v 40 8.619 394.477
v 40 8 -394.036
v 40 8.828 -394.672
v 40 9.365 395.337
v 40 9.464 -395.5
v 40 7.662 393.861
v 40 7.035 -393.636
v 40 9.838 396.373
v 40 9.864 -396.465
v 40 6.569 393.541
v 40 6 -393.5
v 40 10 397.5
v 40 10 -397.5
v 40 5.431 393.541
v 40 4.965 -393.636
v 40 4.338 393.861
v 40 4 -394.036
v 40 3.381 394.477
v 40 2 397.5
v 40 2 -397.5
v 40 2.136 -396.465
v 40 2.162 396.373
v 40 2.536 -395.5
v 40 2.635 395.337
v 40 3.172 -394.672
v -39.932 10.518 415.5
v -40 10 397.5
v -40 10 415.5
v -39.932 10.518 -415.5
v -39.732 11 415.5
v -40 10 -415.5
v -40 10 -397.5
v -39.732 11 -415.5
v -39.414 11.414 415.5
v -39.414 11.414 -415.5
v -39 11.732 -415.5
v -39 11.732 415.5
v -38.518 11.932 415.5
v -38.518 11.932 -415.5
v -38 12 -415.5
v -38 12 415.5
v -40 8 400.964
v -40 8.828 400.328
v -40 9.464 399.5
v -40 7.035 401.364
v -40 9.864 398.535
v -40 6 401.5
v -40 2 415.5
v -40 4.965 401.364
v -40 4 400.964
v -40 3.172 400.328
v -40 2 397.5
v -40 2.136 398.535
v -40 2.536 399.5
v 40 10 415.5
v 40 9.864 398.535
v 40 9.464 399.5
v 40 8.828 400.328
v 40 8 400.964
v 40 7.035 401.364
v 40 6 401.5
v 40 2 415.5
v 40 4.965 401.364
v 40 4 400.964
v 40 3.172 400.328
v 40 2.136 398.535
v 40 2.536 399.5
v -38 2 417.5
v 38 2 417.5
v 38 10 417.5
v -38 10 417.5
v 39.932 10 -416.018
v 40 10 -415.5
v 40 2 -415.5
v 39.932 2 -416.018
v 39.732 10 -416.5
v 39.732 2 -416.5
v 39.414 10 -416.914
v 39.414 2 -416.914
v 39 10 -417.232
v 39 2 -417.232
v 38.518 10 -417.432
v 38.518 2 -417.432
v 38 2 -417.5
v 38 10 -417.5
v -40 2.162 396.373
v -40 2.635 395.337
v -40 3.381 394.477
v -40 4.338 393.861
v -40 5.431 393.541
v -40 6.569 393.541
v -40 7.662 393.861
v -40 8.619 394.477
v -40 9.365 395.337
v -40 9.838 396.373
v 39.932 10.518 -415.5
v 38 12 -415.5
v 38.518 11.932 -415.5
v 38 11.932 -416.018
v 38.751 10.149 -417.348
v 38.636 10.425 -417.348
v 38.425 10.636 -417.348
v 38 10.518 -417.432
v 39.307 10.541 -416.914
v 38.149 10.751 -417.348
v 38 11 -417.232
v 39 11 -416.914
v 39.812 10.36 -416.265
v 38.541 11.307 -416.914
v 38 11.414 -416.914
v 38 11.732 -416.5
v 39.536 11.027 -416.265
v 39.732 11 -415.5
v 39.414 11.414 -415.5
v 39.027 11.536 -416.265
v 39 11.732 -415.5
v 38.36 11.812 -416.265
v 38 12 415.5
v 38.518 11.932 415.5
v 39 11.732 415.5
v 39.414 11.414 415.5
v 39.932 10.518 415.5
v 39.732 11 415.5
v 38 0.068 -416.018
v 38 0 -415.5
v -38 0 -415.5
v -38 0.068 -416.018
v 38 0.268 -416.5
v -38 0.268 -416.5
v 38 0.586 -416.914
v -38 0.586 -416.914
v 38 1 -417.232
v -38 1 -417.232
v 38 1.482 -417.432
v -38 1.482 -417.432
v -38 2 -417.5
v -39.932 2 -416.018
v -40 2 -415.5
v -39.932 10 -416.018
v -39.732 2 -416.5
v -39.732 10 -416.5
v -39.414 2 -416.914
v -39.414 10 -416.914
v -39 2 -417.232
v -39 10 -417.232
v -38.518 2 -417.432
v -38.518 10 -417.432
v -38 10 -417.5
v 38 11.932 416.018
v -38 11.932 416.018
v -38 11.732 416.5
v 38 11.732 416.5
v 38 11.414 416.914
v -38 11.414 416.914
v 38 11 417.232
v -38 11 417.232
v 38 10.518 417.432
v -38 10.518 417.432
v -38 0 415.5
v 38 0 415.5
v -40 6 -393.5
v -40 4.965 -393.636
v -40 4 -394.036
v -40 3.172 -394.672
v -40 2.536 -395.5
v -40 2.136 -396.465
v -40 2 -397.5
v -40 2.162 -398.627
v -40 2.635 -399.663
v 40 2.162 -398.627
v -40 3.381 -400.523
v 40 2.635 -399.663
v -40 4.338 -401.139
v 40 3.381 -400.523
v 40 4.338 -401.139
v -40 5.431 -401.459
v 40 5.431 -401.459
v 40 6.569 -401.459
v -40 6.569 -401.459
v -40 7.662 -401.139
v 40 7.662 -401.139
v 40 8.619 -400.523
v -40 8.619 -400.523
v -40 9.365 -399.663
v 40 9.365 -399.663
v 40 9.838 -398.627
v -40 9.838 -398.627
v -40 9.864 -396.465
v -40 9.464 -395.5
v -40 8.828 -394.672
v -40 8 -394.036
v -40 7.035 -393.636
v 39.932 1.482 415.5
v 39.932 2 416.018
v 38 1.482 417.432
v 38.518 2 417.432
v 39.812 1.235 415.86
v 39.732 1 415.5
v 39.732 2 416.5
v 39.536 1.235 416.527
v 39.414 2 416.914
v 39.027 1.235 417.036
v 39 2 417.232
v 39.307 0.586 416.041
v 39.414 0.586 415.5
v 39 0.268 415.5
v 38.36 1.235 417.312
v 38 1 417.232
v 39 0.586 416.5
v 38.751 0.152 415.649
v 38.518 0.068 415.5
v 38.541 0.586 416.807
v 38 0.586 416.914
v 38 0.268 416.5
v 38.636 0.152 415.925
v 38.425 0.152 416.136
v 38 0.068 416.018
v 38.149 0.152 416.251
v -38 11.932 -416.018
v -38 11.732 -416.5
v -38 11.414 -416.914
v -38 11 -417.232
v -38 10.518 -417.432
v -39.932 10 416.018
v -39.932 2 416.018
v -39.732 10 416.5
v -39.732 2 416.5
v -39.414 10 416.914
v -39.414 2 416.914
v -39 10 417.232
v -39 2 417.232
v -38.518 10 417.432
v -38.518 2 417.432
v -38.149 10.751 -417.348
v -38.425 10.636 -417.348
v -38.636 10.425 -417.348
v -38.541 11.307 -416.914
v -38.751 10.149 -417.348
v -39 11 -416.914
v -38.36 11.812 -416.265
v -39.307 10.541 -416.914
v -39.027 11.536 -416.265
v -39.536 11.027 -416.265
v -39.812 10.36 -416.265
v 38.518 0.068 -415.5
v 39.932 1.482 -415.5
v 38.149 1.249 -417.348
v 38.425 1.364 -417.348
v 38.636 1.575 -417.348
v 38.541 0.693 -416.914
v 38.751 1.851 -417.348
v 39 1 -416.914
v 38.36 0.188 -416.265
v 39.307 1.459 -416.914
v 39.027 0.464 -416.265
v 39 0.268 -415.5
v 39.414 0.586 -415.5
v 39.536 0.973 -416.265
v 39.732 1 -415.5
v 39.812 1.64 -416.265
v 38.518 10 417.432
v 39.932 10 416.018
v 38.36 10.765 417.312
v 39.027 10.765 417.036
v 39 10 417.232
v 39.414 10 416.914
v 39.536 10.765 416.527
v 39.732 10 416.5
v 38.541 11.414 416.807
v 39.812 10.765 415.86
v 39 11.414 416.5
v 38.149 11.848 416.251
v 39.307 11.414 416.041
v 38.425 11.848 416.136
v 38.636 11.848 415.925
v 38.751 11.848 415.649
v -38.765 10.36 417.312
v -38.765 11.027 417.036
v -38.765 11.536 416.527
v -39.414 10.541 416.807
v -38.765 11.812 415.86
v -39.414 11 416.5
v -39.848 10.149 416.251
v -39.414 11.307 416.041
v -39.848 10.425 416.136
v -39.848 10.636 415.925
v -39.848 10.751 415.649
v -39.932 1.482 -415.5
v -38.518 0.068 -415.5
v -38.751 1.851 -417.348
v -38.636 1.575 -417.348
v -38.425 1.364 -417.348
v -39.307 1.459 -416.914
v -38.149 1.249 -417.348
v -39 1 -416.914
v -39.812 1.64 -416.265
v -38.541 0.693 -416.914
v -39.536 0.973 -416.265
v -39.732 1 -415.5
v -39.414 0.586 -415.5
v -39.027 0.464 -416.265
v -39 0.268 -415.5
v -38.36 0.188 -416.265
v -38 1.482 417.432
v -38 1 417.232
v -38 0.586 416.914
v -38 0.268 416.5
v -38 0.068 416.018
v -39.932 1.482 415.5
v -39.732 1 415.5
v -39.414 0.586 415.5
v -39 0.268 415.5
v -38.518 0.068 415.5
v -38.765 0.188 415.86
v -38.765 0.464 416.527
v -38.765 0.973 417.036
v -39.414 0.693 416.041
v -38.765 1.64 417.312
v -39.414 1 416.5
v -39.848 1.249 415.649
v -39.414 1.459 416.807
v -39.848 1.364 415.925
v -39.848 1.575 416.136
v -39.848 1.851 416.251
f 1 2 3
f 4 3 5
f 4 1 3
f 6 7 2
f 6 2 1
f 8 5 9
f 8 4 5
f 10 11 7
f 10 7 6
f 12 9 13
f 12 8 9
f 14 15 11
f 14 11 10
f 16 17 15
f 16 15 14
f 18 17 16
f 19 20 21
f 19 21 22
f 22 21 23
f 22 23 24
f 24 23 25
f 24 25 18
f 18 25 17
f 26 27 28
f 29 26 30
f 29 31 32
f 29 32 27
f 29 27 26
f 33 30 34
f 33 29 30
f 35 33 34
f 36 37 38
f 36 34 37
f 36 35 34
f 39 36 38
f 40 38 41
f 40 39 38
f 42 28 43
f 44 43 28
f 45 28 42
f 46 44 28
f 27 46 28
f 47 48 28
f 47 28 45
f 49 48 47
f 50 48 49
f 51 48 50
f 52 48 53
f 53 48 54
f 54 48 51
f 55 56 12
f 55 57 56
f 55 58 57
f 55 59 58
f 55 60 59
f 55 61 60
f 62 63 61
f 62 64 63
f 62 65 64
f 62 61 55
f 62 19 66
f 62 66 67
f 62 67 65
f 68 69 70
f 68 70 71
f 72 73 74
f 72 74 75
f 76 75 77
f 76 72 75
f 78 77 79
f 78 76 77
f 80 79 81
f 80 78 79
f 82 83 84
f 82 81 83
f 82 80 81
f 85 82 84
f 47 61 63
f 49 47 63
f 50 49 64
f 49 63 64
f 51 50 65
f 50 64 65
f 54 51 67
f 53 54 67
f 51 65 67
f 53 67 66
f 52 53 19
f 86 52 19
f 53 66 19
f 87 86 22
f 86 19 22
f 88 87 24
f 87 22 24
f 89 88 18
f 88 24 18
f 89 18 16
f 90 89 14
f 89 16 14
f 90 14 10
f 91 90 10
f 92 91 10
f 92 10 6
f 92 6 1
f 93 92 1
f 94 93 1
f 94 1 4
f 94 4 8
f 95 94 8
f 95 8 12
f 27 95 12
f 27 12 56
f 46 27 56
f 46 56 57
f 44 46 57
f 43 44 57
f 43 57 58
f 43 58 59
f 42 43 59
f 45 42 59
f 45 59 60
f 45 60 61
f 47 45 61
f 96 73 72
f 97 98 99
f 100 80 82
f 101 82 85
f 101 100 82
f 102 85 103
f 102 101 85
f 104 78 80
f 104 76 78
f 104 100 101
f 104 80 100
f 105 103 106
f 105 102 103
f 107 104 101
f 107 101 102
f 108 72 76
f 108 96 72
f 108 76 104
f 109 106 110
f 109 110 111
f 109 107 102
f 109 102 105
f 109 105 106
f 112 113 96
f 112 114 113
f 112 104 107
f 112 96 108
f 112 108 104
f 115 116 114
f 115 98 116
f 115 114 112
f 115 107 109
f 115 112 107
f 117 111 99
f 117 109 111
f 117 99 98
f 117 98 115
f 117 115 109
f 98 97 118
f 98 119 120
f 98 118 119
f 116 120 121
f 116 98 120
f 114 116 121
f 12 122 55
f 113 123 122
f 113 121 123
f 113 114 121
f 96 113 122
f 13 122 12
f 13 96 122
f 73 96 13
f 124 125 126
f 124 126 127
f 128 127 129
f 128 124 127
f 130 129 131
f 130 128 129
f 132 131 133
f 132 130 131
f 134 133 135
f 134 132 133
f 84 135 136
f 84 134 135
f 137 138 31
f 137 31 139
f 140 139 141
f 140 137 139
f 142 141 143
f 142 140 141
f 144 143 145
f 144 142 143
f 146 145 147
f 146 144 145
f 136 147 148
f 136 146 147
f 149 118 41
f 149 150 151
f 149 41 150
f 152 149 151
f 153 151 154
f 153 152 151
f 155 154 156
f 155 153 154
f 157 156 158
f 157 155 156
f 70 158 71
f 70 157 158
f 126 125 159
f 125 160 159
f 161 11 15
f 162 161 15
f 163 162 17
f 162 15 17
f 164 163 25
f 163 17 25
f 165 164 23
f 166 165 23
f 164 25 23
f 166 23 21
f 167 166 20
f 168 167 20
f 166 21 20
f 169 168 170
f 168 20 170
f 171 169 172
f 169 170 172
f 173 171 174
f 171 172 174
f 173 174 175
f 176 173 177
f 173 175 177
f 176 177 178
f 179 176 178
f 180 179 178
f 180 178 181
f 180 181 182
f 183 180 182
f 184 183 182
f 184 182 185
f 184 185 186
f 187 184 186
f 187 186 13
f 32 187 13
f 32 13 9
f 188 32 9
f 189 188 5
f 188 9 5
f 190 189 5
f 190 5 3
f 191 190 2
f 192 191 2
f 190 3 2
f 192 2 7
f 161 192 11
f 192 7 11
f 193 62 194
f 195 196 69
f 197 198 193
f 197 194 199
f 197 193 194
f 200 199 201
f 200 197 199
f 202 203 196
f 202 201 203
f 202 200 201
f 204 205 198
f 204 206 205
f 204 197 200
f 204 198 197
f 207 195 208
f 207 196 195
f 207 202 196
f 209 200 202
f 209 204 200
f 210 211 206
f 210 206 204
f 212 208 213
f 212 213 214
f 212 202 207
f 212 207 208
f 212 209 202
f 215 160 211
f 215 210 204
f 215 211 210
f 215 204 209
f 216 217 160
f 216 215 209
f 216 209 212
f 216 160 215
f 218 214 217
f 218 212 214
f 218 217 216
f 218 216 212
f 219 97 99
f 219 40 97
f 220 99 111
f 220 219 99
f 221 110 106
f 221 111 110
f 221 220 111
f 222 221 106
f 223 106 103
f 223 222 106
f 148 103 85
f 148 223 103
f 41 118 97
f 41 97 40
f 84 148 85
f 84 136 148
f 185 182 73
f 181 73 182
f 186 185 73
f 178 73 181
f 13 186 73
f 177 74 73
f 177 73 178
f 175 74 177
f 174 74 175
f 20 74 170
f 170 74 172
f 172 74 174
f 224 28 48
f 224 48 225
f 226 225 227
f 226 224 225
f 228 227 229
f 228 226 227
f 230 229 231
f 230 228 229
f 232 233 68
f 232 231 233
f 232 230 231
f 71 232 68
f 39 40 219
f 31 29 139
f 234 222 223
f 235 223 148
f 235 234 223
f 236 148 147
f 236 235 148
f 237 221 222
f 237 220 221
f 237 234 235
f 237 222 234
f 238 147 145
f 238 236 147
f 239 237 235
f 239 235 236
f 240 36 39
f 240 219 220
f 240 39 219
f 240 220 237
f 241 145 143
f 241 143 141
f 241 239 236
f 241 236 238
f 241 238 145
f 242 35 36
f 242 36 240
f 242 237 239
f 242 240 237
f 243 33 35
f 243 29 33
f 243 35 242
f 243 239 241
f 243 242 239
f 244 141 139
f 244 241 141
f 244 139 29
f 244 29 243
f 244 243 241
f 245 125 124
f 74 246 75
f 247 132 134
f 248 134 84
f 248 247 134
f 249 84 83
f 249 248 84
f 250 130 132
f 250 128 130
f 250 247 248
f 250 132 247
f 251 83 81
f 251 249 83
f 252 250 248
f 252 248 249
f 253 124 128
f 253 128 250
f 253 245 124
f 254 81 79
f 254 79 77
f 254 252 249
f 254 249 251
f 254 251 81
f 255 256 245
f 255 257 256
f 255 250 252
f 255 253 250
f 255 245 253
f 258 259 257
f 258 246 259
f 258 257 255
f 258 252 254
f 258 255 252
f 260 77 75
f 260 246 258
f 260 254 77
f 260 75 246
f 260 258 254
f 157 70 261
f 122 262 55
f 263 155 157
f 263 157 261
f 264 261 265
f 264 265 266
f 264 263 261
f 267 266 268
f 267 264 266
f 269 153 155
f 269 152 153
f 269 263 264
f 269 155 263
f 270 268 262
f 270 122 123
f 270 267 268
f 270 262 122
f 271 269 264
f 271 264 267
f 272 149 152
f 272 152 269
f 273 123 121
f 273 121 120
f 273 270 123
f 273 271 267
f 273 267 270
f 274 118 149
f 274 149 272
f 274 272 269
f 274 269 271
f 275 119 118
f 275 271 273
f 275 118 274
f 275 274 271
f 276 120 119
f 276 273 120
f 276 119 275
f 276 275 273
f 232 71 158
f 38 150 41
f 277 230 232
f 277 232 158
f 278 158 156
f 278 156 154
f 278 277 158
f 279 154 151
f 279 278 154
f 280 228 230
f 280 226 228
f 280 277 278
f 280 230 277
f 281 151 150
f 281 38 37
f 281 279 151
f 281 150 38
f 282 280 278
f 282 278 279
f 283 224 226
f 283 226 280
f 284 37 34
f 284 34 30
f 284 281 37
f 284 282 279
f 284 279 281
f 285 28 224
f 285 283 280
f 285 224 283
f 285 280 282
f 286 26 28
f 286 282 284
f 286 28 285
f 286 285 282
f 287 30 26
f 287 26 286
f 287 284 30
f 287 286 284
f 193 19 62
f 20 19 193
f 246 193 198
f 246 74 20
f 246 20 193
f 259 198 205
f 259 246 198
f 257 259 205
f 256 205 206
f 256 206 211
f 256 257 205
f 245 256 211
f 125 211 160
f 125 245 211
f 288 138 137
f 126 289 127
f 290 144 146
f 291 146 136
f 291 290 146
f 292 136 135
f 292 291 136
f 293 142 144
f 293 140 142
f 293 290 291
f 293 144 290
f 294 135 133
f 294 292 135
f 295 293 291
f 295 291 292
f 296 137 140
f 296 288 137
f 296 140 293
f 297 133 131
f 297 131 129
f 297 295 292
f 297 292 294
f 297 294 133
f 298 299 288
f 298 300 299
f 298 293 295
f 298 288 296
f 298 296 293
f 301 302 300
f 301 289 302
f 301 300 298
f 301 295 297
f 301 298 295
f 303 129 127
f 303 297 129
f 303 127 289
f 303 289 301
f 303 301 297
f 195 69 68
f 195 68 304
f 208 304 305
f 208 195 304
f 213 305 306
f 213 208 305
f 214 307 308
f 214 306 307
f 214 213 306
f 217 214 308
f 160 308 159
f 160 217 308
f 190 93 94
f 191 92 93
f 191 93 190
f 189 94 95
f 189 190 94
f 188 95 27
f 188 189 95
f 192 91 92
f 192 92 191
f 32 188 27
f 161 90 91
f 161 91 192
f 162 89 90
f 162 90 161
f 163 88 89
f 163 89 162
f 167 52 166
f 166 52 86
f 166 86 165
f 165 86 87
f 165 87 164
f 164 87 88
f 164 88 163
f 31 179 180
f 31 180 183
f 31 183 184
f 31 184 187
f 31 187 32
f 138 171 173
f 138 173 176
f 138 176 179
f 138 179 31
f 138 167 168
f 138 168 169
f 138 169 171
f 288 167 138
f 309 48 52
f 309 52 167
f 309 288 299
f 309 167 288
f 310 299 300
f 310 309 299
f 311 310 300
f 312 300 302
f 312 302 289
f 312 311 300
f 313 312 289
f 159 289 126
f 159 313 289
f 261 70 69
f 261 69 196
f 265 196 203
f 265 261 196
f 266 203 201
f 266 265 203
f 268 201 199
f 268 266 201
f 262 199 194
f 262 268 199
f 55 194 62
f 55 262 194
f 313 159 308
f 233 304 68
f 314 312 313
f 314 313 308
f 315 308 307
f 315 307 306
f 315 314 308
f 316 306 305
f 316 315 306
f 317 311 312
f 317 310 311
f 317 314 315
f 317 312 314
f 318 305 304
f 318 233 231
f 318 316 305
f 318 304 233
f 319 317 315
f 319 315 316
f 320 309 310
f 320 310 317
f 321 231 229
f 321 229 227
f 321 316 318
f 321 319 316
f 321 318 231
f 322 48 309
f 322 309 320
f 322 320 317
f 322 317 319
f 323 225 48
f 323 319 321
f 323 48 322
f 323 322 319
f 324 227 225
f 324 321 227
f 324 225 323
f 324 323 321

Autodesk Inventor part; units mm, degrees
ref_plane "YZ Plane" through (0, 0, 0) normal (1, 0, 0) x (0, 1, 0)
ref_plane "XZ Plane" through (0, 0, 0) normal (0, 1, 0) x (-1, 0, 0)
ref_plane "XY Plane" through (0, 0, 0) normal (0, 0, 1) x (1, 0, 0)
sketch "Sketch1" plane through (0, 0, 0) normal (0, 1, 0) x (-1, 0, 0)
  line L0 (-40, 417.5) -> (40, 417.5)
  line L1 (40, 417.5) -> (40, -417.5)
  line L2 (40, -417.5) -> (-40, -417.5)
  line L3 (-40, -417.5) -> (-40, 417.5)
  line L4 (-40, 417.5) -> (40, -417.5) construction
  line L5 (40, 417.5) -> (-40, -417.5) construction
  point P0 (0, 0)
  dimension "d0" = 80
  dimension "d1" = 835
extrude "Extrusion1" add sketch "Sketch1" along normal blind 12
fillet "Fillet1" radius 2 1 edges at (40, 6, 417.5)
fillet "Fillet2" radius 2 3 edges at (39.4142, 12, 416.9142) (-1, 12, 417.5) (40, 12, -1)
fillet "Fillet3" radius 2 3 edges at (39.4142, 0, 416.9142) (-1, 0, 417.5) (40, 0, -1)
fillet "Fillet4" radius 2 5 edges at (-40, 6, 417.5) (-40, 0.5858, 416.9142) (-40, 0, -1) (-40, 12, -1) (-40, 11.4142, 416.9142)
fillet "Fillet5" radius 2 8 edges at (-39.4142, 11.4142, -417.5) (0, 12, -417.5) (39.4142, 11.4142, -417.5) (40, 6, -417.5) (39.4142, 0.5858, -417.5) (0, 0, -417.5) (-39.4142, 0.5858, -417.5) (-40, 6, -417.5)
sketch "Sketch2" plane through (-40, 2, -415.5) normal (-1, 0, 0) x (0, 0, 1)
  circle A0 centre (18, 4) radius 4
  line L0 (-2, 8) -> (-2, 0) projected
  line L1 (0, -2) -> (831, -2) projected
  circle A1 centre (813, 4) radius 4
  line L2 (833, 0) -> (833, 8) projected
  line L3 (831, 10) -> (0, 10) projected
  point P0 (415.5, -2)
  dimension "d9" = 8
  dimension "d10" = 20
  dimension "d11" = 6
  dimension "d12" = 8
  dimension "d13" = 20
  dimension "d21" = 6
hole "Hole1" at (-40, 6, -397.5) at (-40, 6, 397.5) direction (1, 0, 0) diameter 8 end through all
equation "\"d12\" = d9"
equation "\"d13\" = d10"
equation "\"d21\" = d11"
properties part number "CeramicModelv2"
